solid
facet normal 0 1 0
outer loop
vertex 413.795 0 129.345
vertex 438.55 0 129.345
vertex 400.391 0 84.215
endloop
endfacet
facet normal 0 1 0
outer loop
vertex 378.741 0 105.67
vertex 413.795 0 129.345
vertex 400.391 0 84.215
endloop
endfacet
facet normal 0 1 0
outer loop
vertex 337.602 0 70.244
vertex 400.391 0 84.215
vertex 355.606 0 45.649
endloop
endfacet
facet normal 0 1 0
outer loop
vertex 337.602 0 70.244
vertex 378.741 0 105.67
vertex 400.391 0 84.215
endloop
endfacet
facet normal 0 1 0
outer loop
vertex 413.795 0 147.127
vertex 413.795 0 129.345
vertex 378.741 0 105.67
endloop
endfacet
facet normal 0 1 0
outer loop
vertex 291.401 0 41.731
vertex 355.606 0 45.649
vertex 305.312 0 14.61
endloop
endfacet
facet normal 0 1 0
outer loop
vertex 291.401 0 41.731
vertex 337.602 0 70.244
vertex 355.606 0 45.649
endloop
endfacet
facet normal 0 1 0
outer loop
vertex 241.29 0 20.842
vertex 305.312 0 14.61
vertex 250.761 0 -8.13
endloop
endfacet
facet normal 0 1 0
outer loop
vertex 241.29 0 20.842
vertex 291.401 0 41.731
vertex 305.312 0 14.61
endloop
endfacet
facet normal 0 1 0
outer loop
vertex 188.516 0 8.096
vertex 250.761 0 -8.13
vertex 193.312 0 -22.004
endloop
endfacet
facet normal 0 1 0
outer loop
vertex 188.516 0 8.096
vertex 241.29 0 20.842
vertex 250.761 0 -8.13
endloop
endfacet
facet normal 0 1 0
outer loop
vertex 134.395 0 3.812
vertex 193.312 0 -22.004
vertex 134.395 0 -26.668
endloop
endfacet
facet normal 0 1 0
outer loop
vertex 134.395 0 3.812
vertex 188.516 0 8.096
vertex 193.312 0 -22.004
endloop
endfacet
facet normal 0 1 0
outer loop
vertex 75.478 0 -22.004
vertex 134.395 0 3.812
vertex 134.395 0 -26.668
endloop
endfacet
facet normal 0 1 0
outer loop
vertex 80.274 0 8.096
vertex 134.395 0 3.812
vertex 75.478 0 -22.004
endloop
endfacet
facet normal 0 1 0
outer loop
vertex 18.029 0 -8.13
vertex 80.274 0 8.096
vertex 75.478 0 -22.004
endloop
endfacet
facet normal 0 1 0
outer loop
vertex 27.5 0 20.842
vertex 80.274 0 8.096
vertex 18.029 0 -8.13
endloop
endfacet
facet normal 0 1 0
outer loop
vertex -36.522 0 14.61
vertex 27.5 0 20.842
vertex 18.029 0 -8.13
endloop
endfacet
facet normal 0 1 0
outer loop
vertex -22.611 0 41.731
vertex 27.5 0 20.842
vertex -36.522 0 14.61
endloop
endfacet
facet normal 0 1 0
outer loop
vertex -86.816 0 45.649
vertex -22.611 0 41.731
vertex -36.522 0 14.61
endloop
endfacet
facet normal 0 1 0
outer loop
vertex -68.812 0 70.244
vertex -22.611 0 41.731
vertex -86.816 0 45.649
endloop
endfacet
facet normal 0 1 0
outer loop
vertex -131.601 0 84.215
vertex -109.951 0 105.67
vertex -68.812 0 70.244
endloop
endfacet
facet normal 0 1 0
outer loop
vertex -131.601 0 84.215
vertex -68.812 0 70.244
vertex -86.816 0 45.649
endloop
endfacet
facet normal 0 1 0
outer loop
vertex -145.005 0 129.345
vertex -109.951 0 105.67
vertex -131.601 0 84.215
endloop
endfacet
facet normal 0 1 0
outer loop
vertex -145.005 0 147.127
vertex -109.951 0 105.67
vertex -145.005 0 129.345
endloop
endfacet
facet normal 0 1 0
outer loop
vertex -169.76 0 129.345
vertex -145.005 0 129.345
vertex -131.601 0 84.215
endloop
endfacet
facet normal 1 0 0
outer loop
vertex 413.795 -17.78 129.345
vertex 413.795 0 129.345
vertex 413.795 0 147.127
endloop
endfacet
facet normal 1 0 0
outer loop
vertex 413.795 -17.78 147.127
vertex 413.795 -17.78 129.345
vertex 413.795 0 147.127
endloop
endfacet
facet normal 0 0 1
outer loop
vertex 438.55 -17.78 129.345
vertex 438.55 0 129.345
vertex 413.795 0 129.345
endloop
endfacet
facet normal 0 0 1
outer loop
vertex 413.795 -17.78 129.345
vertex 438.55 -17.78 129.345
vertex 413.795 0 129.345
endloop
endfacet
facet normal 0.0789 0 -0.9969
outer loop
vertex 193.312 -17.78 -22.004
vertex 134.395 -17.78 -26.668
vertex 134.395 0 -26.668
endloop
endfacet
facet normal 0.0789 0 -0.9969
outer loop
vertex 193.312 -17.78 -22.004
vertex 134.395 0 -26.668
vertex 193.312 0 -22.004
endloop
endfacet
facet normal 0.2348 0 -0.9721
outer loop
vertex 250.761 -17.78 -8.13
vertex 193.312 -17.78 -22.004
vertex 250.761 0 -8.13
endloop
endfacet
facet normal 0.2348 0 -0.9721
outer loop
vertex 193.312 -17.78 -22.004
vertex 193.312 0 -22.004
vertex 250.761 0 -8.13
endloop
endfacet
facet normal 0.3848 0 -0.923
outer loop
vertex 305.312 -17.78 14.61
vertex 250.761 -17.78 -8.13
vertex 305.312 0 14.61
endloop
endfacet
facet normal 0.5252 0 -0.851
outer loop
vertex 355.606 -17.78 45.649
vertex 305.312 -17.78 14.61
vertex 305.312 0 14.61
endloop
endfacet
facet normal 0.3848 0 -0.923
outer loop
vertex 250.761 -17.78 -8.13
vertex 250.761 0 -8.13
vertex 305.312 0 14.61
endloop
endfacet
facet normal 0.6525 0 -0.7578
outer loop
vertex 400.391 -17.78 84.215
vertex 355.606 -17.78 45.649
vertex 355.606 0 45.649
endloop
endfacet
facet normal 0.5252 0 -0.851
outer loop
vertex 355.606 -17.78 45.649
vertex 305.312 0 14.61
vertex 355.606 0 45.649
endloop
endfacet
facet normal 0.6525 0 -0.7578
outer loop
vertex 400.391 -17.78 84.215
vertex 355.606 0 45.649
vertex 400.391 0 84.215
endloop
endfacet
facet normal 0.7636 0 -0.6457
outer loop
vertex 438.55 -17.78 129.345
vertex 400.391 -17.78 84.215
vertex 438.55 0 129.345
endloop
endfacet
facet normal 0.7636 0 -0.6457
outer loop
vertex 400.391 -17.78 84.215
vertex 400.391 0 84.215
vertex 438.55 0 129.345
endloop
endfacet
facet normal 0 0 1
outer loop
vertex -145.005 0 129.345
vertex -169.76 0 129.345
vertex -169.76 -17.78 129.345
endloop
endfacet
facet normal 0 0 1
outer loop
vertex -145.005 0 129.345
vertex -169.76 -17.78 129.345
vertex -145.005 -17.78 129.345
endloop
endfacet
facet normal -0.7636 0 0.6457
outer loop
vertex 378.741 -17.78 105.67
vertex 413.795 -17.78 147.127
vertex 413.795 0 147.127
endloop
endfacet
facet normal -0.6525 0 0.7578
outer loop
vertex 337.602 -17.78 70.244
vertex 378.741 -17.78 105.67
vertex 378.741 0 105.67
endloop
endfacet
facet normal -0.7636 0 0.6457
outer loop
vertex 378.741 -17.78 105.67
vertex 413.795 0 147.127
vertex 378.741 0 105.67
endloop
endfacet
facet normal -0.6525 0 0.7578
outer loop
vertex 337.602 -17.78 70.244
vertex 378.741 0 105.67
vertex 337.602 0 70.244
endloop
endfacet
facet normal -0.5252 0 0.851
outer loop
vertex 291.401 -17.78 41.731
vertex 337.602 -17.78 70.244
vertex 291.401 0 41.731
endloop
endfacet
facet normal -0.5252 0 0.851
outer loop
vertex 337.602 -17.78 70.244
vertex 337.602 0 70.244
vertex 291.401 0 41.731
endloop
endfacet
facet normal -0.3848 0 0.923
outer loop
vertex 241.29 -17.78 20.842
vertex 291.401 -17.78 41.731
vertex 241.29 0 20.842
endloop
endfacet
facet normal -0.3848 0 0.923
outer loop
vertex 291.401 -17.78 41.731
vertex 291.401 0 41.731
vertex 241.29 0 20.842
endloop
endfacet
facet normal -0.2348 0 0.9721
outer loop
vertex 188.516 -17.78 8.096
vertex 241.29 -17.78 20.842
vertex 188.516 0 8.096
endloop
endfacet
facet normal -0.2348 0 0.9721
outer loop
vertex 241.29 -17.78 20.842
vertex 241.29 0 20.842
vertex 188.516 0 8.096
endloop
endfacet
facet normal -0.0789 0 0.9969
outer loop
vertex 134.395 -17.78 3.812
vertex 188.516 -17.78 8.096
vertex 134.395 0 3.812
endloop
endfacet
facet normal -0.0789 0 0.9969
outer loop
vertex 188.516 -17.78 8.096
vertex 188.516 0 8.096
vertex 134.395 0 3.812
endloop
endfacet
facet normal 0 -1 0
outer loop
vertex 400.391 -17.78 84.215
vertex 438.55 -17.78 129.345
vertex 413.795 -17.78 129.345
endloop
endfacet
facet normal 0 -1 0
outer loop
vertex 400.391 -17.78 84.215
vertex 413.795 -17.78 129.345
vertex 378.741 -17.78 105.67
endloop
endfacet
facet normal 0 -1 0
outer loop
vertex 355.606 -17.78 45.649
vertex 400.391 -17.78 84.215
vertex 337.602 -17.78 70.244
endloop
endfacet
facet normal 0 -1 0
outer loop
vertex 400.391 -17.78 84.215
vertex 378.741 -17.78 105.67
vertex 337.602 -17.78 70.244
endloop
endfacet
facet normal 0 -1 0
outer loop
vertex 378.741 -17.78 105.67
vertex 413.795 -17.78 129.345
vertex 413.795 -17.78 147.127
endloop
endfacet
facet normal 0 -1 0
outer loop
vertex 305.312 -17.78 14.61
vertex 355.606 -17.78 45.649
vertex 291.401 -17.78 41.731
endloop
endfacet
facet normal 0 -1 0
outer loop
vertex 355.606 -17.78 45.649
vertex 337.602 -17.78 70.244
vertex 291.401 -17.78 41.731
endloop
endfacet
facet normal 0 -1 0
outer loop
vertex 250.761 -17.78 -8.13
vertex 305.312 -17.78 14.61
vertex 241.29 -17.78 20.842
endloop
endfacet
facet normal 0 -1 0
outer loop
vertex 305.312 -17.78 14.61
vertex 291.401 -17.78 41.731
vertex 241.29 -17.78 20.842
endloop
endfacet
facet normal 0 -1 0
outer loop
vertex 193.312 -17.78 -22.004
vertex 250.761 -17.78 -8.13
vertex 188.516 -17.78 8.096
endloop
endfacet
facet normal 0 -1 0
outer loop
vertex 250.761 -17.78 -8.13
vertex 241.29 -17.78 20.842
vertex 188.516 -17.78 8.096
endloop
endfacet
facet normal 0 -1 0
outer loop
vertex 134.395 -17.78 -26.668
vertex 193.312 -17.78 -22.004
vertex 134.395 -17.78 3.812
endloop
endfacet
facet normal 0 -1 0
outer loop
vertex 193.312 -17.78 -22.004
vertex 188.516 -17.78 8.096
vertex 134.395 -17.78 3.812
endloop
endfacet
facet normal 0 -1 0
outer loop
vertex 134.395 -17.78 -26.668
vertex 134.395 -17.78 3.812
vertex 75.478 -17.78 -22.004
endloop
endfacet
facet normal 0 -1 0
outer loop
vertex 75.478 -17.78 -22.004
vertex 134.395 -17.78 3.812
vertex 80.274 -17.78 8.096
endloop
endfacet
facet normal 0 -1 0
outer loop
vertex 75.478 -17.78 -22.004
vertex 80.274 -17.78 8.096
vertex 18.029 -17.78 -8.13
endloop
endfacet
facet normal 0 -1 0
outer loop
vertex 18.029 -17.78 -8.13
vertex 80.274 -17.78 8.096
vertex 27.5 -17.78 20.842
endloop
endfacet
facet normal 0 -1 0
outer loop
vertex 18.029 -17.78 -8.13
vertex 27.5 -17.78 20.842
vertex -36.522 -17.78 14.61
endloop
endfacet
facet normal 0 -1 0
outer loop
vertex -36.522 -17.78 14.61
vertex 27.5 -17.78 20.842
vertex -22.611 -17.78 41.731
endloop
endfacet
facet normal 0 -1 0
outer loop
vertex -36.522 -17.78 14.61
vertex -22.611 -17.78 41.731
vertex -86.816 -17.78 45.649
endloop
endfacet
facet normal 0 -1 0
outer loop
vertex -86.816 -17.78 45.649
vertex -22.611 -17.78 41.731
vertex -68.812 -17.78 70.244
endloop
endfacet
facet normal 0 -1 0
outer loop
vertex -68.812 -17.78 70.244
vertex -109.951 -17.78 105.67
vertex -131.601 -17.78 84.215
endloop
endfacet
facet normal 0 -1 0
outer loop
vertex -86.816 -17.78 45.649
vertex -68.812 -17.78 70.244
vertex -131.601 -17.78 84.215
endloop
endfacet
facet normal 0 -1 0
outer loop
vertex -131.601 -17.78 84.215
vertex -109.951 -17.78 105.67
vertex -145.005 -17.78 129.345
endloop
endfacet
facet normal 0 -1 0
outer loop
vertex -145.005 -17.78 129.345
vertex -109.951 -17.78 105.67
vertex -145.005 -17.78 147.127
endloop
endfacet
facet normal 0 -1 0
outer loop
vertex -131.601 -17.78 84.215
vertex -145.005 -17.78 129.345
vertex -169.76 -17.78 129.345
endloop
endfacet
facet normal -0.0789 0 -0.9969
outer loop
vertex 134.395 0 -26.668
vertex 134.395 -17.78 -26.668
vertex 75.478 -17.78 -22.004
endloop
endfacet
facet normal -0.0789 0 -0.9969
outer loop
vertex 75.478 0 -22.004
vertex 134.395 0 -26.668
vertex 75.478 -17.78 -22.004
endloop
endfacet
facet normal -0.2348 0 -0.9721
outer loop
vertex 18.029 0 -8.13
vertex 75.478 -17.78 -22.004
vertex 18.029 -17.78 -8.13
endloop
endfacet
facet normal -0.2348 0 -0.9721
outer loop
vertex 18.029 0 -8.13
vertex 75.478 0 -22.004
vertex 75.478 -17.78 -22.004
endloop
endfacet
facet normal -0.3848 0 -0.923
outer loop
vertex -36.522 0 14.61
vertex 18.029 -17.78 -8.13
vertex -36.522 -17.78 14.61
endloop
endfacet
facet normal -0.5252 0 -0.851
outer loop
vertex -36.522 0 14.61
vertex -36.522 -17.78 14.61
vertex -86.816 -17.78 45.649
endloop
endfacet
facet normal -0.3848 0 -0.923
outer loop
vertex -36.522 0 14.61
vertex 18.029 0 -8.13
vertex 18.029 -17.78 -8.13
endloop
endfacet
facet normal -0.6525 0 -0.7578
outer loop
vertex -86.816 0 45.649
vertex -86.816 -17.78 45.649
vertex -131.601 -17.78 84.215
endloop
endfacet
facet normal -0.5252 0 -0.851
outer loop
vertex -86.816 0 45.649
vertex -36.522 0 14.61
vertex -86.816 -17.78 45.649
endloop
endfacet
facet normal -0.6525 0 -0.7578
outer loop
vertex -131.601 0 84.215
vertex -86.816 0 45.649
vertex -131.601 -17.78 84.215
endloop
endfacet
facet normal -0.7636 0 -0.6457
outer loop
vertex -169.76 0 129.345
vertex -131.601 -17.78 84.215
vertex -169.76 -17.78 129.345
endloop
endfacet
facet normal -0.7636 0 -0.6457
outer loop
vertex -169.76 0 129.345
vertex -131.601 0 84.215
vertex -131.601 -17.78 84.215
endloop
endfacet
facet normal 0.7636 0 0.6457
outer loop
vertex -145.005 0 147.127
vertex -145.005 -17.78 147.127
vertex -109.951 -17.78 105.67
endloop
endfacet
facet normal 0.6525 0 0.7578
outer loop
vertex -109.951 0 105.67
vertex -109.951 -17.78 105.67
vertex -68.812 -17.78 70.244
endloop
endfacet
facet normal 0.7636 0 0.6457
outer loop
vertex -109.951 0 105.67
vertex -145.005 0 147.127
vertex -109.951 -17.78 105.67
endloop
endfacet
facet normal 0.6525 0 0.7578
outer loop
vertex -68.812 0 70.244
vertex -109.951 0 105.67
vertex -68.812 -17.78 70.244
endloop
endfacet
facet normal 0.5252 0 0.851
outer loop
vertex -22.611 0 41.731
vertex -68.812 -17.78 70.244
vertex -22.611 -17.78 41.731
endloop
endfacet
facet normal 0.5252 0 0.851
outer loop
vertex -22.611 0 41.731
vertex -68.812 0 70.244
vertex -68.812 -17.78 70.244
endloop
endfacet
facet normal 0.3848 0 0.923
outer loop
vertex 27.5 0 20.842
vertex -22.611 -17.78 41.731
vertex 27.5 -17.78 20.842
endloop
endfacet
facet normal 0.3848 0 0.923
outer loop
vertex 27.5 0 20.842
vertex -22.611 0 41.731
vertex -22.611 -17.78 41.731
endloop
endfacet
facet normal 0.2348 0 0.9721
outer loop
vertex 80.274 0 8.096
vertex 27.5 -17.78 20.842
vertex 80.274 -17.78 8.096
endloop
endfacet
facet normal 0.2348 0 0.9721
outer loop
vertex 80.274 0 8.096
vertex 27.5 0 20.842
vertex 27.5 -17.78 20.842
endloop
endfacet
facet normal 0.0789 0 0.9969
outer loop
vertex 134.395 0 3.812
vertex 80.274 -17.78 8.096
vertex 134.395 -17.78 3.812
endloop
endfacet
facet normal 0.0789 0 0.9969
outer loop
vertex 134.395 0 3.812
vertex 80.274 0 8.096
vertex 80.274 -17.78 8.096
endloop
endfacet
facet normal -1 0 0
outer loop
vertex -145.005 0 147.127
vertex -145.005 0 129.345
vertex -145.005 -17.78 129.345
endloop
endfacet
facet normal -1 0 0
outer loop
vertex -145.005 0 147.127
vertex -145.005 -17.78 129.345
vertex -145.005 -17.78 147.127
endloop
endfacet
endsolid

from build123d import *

# Parameters (mm, degrees)
F1_DEPTH = 17.78


with BuildPart() as f1:
    # F0 (on Front) → F1 (new body)
    with BuildSketch(Plane.XZ):
        with BuildLine():
            ThreePointArc((413.79494, 147.127099), (291.400901, 41.730789), (134.39494, 3.812313))
            Line((134.39494, 3.812313), (134.39494, -26.667687))
            ThreePointArc((134.39494, -26.667687), (305.311948, 14.610443), (438.550347, 129.34508))
            Line((438.550347, 129.34508), (413.79494, 129.34508))
            Line((413.79494, 129.34508), (413.79494, 147.127099))
        make_face()
    extrude(amount=F1_DEPTH)

    # F2: F1 across face


with BuildPart() as f1_1:
    add(f1.part)
    add(f1.part.mirror(Plane(origin=(134.39494, -8.89, -11.427687), x_dir=(0, -1, 0), z_dir=(-1, 0, 0))))


solid = f1_1.part
